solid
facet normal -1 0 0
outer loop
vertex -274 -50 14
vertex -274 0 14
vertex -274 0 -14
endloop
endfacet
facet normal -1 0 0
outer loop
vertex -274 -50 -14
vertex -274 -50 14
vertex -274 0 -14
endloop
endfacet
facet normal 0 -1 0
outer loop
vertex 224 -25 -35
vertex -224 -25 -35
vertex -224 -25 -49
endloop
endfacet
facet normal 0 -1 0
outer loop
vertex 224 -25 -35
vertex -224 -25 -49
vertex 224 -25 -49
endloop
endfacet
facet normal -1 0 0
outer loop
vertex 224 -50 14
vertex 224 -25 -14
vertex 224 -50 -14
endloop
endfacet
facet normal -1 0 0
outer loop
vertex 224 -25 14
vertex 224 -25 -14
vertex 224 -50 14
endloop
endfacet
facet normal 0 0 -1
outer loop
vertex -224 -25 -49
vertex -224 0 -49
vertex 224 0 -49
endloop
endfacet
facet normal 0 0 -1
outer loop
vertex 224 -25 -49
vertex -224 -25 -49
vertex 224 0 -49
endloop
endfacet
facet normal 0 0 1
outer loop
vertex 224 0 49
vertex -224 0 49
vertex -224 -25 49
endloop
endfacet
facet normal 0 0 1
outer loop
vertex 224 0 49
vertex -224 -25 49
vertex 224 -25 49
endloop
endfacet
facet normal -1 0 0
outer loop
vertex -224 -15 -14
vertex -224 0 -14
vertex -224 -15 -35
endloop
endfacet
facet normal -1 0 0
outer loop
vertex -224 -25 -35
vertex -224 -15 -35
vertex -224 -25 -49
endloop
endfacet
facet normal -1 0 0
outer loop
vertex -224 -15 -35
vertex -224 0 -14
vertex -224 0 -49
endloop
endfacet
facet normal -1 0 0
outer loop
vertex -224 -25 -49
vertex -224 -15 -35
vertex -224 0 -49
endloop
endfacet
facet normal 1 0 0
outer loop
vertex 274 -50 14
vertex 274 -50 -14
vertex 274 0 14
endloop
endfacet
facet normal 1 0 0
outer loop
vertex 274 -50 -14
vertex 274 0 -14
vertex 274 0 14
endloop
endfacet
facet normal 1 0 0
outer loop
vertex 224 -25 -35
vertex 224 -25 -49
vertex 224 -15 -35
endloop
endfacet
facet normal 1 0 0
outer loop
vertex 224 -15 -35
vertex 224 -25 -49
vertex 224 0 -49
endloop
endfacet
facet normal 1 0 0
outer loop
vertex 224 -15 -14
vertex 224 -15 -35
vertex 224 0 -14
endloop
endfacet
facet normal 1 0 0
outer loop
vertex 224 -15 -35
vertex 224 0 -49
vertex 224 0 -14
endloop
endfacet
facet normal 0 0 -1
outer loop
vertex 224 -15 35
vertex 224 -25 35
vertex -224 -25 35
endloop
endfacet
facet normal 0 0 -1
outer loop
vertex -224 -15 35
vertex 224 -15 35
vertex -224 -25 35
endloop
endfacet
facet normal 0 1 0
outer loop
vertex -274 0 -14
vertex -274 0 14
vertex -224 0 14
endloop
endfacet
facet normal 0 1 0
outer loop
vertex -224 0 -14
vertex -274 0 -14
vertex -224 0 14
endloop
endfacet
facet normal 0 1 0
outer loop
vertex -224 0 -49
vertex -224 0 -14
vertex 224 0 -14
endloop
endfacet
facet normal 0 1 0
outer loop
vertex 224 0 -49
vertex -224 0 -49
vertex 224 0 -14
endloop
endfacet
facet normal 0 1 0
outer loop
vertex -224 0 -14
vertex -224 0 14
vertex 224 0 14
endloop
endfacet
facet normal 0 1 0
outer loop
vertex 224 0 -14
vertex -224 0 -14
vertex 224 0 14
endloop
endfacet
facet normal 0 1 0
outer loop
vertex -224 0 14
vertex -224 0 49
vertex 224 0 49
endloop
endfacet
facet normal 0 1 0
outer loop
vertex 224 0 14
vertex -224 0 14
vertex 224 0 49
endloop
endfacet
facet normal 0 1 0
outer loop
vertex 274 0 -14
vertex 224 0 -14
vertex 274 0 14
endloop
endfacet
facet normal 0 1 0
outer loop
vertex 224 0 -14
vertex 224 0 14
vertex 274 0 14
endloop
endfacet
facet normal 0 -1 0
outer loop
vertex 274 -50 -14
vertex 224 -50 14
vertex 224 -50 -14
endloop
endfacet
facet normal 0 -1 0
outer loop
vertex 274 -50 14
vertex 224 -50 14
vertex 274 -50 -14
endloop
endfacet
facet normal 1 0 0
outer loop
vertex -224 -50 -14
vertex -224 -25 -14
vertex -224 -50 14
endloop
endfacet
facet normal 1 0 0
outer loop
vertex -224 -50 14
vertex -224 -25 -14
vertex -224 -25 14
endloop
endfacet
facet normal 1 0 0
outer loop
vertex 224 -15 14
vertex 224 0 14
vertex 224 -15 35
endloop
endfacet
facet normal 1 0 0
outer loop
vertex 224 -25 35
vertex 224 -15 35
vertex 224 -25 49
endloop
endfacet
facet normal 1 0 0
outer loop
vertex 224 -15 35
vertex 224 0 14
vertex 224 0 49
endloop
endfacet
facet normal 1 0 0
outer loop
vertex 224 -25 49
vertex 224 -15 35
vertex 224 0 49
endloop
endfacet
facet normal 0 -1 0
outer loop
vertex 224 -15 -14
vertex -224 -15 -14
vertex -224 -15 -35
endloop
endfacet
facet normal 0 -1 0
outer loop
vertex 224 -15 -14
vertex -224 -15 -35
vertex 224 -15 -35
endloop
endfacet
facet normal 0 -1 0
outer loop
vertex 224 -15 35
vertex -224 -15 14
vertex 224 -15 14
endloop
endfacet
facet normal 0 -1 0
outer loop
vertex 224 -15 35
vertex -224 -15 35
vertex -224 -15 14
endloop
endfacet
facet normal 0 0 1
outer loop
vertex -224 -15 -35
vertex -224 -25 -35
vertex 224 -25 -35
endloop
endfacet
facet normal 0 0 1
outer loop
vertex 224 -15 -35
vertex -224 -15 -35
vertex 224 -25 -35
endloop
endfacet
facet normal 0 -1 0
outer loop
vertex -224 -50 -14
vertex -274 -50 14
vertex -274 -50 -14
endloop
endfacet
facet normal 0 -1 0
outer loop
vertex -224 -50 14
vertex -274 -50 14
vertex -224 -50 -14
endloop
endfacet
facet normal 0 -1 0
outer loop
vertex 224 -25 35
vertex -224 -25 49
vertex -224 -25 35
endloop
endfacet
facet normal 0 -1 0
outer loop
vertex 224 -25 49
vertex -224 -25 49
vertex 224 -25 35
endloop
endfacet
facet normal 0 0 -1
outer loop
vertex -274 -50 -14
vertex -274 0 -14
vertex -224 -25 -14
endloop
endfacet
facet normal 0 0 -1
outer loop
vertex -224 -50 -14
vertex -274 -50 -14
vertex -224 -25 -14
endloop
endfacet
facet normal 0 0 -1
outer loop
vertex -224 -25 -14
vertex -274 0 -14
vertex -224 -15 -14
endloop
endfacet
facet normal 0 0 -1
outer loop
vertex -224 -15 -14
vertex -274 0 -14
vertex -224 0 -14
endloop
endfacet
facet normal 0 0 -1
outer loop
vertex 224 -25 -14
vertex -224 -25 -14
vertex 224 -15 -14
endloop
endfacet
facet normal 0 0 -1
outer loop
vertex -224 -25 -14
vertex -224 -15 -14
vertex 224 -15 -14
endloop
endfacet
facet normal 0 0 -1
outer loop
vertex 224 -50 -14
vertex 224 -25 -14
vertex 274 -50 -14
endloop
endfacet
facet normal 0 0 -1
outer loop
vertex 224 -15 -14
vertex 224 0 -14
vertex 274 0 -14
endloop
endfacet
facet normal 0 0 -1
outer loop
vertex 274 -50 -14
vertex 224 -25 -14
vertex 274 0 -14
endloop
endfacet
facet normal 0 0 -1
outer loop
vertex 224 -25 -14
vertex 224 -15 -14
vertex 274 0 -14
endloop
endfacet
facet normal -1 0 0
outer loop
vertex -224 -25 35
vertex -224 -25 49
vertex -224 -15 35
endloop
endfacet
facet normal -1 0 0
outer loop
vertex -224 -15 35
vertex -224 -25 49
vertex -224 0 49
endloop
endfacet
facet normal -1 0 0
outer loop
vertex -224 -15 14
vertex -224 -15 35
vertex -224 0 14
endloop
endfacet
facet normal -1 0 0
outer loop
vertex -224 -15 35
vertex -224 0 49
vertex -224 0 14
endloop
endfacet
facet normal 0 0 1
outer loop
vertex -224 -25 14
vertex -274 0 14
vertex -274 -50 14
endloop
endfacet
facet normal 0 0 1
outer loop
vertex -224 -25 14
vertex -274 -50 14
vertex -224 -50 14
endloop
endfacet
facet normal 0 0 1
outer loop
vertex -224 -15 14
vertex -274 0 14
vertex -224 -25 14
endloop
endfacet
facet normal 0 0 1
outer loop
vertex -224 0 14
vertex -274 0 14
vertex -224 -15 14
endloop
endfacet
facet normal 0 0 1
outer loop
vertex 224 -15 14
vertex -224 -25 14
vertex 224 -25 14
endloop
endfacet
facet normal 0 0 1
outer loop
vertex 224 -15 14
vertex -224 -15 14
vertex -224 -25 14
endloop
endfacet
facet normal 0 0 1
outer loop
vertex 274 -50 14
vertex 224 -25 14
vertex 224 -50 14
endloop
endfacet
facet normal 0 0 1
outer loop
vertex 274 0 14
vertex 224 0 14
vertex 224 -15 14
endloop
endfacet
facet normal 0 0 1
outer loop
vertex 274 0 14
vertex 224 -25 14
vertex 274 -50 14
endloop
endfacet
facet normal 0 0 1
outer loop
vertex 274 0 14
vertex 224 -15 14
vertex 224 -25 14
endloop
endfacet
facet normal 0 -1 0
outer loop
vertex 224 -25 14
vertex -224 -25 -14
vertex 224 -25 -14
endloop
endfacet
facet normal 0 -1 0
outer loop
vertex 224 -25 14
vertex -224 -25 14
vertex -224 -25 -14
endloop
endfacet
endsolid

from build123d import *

# Parameters (mm, degrees)
F0_W     = 448
F0_H     = 14
F0_H_2   = 21
F1_DEPTH = 25
F2_W     = 448
F2_H     = 21
F3_DEPTH = 10
F4_W     = 50
F4_H     = 28
F5_DEPTH = 25


with BuildPart() as f1:
    # F0 (on Front) → F1 (new body)
    with BuildSketch(Plane.XZ):
        with Locations((0, 42)):
            Rectangle(F0_W, F0_H)
        with Locations((0, -42)):
            Rectangle(F0_W, F0_H)
        Polygon((-224, 0), (-224, 14), (-274, 14), (-274, 0), (-274, -14), (-224, -14), align=None)
        Polygon((274, 14), (224, 14), (224, 0), (224, -14), (274, -14), (274, 0), align=None)
        with Locations((0, 24.5)):
            Rectangle(F0_W, F0_H_2)
        Polygon((224, 0), (224, 14), (-224, 14), (-224, 0), (-224, -14), (224, -14), align=None)
        with Locations((0, -24.5)):
            Rectangle(F0_W, F0_H_2)
    extrude(amount=F1_DEPTH)

    # F2 (on face) → F3 (cut)
    with BuildSketch(Plane.XZ.offset(25)):
        Polygon((-224, 31.5), (-224, 14), (224, 14), (224, 35), (-224, 35), align=None)
        with Locations((0, -24.5)):
            Rectangle(F2_W, F2_H)
    extrude(amount=-F3_DEPTH, mode=Mode.SUBTRACT)

    # F4 (on face) → F5 (join)
    with BuildSketch(Plane.XZ.offset(25)):
        with Locations((249, 0)):
            Rectangle(F4_W, F4_H)
        with Locations((-249, 0)):
            Rectangle(F4_W, F4_H)
    extrude(amount=F5_DEPTH)


solid = f1.part
